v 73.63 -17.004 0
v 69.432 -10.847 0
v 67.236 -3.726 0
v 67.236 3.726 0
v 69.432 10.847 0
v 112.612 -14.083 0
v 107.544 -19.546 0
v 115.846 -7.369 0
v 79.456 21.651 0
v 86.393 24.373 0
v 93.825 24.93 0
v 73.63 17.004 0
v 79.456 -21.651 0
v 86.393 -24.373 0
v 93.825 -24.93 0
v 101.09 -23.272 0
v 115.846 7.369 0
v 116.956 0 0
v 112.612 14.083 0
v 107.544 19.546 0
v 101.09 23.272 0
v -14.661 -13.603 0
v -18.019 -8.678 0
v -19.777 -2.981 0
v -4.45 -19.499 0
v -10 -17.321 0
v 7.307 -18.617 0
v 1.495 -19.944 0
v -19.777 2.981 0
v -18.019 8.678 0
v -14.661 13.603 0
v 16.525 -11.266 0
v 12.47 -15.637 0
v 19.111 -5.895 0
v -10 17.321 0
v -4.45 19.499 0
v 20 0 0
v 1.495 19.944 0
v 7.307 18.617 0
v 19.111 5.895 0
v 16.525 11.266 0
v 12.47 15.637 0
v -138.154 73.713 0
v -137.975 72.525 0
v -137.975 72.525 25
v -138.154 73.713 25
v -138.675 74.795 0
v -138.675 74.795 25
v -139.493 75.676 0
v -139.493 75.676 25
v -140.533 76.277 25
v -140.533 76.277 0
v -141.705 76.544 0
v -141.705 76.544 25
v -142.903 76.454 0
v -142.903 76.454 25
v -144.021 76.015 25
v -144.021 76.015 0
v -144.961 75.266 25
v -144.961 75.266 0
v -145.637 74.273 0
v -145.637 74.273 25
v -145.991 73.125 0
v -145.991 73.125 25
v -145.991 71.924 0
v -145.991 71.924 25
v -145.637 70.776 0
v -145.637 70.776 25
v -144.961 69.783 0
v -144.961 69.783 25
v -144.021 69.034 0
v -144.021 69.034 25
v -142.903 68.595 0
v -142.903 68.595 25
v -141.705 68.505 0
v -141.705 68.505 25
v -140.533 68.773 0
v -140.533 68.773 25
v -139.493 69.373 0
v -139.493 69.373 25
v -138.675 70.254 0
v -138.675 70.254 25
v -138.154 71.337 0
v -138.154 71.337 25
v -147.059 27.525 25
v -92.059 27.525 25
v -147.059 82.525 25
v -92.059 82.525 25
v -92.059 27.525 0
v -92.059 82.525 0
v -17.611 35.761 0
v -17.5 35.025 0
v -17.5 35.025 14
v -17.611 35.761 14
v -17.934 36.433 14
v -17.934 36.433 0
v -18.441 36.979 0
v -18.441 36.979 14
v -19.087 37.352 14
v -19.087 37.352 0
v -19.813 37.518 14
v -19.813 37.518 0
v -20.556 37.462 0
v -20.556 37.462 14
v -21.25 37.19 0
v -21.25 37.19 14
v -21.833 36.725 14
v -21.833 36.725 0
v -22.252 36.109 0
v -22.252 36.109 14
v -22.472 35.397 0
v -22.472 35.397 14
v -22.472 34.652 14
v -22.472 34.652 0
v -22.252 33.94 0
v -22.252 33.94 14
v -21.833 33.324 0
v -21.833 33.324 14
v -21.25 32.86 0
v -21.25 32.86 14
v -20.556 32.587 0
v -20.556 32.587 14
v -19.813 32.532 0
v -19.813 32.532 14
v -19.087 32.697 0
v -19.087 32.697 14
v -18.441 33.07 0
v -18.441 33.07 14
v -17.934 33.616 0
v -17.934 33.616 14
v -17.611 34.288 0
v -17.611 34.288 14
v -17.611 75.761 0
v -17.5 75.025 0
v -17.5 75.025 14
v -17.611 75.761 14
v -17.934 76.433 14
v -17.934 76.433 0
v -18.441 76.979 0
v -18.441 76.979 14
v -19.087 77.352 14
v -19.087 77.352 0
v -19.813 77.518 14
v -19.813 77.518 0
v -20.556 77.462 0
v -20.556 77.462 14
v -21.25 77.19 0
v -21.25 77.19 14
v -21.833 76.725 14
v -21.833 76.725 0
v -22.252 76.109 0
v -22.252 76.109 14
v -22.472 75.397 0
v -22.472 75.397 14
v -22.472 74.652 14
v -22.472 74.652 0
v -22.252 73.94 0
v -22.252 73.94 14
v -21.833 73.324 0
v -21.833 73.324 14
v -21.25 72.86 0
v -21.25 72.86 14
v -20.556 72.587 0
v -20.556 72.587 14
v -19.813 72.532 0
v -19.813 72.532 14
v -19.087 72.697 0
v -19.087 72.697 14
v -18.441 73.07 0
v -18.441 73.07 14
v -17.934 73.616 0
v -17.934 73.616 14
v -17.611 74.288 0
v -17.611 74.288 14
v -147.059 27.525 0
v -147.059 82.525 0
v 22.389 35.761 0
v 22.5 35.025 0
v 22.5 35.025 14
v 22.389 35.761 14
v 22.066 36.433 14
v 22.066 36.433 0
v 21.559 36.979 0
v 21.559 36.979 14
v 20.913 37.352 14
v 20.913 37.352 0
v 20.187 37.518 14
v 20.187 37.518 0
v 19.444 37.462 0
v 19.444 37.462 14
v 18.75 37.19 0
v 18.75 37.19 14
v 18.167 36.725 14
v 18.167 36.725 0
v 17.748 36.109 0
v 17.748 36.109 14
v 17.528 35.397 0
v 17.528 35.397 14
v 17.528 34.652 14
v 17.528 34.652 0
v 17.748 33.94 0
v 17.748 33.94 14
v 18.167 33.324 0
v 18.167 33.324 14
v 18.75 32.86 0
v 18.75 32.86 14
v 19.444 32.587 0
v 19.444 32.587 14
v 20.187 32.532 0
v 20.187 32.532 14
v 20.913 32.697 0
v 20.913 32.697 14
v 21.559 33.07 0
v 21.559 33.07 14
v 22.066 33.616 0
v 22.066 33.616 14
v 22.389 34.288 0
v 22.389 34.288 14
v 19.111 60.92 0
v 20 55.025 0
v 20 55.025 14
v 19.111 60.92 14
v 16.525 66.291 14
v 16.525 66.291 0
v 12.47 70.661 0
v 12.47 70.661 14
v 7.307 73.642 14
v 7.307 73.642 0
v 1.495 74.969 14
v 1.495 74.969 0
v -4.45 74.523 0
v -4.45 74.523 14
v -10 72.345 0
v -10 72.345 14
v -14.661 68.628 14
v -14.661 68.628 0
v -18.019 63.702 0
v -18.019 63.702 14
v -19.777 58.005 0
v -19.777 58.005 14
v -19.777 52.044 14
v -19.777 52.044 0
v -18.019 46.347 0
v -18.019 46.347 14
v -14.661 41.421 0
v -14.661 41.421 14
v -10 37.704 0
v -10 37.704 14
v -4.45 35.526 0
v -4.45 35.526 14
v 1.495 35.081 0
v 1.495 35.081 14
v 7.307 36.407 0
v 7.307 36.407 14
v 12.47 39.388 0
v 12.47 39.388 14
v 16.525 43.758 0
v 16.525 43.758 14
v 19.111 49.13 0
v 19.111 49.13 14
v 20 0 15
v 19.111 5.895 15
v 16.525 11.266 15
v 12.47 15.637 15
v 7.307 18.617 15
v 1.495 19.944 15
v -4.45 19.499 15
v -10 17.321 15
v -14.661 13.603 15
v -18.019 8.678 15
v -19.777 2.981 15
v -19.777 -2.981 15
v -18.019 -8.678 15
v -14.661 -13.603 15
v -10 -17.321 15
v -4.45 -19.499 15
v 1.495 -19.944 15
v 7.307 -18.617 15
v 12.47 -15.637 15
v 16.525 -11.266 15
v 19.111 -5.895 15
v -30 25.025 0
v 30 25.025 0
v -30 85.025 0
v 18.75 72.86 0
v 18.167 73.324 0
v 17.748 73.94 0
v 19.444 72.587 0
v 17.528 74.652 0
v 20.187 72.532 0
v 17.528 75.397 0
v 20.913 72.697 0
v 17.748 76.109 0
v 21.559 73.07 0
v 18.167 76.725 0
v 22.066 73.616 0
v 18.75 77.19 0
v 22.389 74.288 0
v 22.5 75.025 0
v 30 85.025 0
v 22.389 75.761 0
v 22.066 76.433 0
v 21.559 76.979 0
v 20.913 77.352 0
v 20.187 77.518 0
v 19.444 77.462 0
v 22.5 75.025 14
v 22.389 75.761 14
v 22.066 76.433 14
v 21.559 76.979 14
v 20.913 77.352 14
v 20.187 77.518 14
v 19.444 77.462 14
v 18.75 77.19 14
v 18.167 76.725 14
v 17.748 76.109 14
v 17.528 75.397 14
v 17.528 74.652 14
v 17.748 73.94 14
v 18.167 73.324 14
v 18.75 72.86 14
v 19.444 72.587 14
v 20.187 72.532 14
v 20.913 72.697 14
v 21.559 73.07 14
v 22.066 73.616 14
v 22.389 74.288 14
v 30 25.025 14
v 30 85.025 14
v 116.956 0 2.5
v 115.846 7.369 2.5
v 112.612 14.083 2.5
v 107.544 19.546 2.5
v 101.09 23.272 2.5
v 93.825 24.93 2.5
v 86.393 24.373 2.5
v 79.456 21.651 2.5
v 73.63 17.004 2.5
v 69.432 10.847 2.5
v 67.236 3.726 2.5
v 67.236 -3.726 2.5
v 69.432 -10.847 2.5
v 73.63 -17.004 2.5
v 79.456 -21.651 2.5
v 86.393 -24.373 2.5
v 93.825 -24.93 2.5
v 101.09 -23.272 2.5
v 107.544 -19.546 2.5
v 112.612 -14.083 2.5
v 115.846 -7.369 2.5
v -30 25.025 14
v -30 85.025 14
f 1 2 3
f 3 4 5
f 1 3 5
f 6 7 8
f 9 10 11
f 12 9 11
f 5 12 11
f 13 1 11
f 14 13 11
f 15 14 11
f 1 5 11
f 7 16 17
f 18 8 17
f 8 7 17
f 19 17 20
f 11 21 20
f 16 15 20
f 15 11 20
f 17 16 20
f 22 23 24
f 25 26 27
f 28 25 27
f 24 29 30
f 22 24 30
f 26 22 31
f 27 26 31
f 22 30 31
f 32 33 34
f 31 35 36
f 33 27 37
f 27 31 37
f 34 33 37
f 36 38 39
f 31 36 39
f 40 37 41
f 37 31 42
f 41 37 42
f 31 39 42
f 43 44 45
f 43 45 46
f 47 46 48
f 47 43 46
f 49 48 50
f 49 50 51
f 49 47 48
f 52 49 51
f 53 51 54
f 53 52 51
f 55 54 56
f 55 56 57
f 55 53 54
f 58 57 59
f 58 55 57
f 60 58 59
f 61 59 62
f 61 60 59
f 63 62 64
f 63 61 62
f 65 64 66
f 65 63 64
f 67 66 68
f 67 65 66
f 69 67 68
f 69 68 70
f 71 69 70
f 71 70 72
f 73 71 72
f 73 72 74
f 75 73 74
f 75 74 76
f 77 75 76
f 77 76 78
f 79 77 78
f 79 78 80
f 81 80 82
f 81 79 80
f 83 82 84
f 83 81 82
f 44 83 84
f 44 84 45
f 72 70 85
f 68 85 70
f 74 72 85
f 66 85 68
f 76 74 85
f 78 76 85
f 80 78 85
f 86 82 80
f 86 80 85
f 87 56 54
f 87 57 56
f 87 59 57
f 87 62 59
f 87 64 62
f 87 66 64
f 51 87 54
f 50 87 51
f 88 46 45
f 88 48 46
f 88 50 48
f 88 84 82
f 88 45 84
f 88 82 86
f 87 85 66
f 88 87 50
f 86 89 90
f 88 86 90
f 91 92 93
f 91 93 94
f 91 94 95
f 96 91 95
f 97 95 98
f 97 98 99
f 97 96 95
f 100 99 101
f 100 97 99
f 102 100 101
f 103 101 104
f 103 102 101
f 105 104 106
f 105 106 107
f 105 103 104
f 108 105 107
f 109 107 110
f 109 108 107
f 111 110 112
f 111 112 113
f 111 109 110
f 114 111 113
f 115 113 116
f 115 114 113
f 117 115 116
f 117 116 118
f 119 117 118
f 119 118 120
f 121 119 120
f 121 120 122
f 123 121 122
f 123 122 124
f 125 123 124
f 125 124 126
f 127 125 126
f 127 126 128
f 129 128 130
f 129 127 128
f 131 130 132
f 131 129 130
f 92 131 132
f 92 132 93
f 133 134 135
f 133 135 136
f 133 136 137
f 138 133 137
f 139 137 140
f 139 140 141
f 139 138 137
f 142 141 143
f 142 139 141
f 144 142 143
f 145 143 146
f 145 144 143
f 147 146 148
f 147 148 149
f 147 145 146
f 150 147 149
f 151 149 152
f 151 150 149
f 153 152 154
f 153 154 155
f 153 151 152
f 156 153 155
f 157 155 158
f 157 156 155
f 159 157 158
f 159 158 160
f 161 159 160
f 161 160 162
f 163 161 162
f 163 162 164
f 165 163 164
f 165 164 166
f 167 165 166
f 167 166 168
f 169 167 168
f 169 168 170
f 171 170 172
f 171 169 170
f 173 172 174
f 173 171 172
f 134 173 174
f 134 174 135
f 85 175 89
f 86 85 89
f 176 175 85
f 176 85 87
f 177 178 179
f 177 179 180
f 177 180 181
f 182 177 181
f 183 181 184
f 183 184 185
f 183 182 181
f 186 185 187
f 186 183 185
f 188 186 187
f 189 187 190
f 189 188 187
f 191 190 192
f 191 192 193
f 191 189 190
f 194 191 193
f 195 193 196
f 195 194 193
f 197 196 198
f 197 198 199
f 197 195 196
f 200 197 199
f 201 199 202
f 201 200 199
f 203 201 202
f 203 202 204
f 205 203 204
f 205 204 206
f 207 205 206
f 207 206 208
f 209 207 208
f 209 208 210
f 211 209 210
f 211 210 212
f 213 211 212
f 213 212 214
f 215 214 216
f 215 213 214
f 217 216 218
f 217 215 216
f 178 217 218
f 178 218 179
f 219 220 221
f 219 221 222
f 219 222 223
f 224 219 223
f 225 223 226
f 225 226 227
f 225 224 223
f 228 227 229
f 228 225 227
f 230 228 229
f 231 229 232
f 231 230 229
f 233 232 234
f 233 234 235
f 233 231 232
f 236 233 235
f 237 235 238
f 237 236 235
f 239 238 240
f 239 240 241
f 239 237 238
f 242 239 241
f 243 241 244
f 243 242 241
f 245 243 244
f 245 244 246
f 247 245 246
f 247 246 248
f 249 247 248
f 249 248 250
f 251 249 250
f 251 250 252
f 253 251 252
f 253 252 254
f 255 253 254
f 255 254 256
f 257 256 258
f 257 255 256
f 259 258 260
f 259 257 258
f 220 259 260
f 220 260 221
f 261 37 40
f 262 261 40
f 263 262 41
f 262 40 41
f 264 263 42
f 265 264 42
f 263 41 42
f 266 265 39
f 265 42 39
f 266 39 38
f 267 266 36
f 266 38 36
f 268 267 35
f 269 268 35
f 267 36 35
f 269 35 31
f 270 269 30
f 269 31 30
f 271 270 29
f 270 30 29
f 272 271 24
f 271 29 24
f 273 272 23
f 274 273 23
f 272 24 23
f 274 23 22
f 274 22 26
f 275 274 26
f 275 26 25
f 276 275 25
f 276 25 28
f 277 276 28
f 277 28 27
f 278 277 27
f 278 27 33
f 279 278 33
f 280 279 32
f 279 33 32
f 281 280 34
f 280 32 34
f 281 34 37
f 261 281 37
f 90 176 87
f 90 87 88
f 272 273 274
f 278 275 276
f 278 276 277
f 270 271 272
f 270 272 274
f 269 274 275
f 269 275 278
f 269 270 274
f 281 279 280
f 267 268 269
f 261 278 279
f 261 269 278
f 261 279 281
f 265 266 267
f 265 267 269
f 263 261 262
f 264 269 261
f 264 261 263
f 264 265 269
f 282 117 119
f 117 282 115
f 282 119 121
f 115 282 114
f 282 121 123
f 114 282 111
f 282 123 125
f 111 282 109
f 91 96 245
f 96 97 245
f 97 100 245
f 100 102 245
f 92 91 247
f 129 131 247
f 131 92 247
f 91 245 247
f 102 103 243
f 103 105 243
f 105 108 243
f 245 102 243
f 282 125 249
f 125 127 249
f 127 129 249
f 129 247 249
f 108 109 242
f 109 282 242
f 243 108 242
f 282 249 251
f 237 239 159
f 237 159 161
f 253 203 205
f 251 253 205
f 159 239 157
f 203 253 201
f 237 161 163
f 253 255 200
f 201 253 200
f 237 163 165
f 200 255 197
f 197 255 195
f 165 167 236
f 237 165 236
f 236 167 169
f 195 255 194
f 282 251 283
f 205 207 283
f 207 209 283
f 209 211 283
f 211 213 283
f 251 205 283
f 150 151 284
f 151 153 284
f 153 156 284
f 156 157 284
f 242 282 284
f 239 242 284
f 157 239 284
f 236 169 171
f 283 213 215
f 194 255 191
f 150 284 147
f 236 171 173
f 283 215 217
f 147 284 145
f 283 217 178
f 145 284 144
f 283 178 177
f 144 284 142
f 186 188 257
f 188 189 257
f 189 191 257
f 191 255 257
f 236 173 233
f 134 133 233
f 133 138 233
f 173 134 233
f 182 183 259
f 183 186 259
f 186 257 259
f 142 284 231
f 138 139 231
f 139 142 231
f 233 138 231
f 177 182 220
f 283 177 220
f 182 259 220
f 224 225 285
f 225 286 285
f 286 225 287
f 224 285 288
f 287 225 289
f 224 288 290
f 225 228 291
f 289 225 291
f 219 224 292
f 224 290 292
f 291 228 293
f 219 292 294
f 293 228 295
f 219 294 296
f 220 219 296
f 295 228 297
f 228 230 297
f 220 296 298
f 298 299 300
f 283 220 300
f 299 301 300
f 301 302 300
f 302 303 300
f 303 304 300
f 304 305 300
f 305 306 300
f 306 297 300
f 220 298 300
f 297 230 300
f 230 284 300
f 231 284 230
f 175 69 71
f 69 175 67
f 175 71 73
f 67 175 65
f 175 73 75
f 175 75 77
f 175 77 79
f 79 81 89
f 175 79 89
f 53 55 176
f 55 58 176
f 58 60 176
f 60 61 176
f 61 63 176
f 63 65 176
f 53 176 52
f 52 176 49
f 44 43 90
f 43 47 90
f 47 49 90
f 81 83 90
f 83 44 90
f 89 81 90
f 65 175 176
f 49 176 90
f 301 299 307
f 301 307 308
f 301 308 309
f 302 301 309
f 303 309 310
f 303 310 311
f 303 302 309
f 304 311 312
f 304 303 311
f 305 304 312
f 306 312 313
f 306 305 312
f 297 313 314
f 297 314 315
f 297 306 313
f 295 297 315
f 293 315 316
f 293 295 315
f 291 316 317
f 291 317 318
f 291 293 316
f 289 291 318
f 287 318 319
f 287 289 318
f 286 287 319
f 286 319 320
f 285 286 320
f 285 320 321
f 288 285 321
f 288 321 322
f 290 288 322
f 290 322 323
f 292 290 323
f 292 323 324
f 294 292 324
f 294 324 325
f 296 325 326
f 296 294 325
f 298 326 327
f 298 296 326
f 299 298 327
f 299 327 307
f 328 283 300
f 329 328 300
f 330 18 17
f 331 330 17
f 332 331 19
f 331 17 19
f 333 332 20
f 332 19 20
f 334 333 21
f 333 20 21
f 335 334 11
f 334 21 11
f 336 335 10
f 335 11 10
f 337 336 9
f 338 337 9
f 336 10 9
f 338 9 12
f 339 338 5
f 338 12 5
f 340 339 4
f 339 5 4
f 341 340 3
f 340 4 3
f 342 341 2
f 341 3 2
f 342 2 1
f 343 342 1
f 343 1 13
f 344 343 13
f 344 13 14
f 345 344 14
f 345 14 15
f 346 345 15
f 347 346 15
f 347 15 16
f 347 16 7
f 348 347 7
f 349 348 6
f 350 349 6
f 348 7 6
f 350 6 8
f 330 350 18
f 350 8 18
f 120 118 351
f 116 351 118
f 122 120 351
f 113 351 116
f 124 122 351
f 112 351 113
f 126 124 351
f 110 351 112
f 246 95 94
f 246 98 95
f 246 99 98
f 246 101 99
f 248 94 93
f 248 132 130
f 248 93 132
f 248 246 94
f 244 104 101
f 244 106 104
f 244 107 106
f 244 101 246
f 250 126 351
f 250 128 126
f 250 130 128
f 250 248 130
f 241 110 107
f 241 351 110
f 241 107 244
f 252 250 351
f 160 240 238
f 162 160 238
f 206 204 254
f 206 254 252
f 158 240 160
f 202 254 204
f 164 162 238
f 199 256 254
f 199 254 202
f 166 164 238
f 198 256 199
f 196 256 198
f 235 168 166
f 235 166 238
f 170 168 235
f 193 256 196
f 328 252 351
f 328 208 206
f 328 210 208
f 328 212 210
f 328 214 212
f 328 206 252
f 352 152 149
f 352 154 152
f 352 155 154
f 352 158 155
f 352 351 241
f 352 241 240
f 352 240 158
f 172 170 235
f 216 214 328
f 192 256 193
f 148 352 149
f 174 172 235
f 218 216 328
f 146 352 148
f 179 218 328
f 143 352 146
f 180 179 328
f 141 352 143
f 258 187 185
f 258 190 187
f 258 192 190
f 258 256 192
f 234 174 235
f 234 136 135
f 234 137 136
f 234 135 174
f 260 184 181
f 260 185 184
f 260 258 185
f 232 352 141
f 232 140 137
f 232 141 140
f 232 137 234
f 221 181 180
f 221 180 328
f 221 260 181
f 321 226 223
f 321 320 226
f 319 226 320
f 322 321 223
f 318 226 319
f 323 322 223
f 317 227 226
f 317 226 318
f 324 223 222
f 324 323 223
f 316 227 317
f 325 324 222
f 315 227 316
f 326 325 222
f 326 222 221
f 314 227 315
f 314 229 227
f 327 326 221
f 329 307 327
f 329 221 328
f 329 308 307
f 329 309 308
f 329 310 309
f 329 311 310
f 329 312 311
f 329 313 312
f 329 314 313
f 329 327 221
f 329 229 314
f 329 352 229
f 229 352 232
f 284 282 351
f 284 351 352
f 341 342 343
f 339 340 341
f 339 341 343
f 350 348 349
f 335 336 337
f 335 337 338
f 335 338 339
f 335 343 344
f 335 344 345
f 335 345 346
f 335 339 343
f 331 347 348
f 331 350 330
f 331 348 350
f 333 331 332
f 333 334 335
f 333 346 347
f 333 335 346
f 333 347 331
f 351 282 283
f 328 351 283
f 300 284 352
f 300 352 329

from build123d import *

# Parameters (mm, degrees)
F0_R     = 20
F1_DEPTH = 15
F0_W     = 60
F0_H     = 60
F0_R_2   = 2.5
F2_DEPTH = 14
F0_R_3   = 25
F3_DEPTH = 2.5
F0_W_2   = 55
F0_H_2   = 55
F0_R_4   = 4.030686
F4_DEPTH = 25


with BuildPart() as f1:
    # F0 (on Top) → F1 (new body)
    with BuildSketch(Plane.XY):
        Circle(F0_R)
    extrude(amount=F1_DEPTH)


with BuildPart() as f2:
    # F0 (on Top) → F2 (new body)
    with BuildSketch(Plane.XY):
        with Locations((0, 55.024605)):
            Rectangle(F0_W, F0_H)
        with Locations((-20, 35.024605)):
            Circle(F0_R_2, mode=Mode.SUBTRACT)
        with Locations((-20, 75.024605)):
            Circle(F0_R_2, mode=Mode.SUBTRACT)
        with Locations((20, 35.024605)):
            Circle(F0_R_2, mode=Mode.SUBTRACT)
        with Locations((0, 55.024605)):
            Circle(F0_R, mode=Mode.SUBTRACT)
        with Locations((20, 75.024605)):
            Circle(F0_R_2, mode=Mode.SUBTRACT)
    extrude(amount=F2_DEPTH)


with BuildPart() as f3:
    # F0 (on Top) → F3 (new body)
    with BuildSketch(Plane.XY):
        with Locations((91.956377, 0)):
            Circle(F0_R_3)
    extrude(amount=F3_DEPTH)


with BuildPart() as f4:
    # F0 (on Top) → F4 (new body)
    with BuildSketch(Plane.XY):
        with Locations((-119.55893, 55.024605)):
            Rectangle(F0_W_2, F0_H_2)
        with Locations((-142.005801, 72.524605)):
            Circle(F0_R_4, mode=Mode.SUBTRACT)
    extrude(amount=F4_DEPTH)


solid = Compound([f1.part, f2.part, f3.part, f4.part])
